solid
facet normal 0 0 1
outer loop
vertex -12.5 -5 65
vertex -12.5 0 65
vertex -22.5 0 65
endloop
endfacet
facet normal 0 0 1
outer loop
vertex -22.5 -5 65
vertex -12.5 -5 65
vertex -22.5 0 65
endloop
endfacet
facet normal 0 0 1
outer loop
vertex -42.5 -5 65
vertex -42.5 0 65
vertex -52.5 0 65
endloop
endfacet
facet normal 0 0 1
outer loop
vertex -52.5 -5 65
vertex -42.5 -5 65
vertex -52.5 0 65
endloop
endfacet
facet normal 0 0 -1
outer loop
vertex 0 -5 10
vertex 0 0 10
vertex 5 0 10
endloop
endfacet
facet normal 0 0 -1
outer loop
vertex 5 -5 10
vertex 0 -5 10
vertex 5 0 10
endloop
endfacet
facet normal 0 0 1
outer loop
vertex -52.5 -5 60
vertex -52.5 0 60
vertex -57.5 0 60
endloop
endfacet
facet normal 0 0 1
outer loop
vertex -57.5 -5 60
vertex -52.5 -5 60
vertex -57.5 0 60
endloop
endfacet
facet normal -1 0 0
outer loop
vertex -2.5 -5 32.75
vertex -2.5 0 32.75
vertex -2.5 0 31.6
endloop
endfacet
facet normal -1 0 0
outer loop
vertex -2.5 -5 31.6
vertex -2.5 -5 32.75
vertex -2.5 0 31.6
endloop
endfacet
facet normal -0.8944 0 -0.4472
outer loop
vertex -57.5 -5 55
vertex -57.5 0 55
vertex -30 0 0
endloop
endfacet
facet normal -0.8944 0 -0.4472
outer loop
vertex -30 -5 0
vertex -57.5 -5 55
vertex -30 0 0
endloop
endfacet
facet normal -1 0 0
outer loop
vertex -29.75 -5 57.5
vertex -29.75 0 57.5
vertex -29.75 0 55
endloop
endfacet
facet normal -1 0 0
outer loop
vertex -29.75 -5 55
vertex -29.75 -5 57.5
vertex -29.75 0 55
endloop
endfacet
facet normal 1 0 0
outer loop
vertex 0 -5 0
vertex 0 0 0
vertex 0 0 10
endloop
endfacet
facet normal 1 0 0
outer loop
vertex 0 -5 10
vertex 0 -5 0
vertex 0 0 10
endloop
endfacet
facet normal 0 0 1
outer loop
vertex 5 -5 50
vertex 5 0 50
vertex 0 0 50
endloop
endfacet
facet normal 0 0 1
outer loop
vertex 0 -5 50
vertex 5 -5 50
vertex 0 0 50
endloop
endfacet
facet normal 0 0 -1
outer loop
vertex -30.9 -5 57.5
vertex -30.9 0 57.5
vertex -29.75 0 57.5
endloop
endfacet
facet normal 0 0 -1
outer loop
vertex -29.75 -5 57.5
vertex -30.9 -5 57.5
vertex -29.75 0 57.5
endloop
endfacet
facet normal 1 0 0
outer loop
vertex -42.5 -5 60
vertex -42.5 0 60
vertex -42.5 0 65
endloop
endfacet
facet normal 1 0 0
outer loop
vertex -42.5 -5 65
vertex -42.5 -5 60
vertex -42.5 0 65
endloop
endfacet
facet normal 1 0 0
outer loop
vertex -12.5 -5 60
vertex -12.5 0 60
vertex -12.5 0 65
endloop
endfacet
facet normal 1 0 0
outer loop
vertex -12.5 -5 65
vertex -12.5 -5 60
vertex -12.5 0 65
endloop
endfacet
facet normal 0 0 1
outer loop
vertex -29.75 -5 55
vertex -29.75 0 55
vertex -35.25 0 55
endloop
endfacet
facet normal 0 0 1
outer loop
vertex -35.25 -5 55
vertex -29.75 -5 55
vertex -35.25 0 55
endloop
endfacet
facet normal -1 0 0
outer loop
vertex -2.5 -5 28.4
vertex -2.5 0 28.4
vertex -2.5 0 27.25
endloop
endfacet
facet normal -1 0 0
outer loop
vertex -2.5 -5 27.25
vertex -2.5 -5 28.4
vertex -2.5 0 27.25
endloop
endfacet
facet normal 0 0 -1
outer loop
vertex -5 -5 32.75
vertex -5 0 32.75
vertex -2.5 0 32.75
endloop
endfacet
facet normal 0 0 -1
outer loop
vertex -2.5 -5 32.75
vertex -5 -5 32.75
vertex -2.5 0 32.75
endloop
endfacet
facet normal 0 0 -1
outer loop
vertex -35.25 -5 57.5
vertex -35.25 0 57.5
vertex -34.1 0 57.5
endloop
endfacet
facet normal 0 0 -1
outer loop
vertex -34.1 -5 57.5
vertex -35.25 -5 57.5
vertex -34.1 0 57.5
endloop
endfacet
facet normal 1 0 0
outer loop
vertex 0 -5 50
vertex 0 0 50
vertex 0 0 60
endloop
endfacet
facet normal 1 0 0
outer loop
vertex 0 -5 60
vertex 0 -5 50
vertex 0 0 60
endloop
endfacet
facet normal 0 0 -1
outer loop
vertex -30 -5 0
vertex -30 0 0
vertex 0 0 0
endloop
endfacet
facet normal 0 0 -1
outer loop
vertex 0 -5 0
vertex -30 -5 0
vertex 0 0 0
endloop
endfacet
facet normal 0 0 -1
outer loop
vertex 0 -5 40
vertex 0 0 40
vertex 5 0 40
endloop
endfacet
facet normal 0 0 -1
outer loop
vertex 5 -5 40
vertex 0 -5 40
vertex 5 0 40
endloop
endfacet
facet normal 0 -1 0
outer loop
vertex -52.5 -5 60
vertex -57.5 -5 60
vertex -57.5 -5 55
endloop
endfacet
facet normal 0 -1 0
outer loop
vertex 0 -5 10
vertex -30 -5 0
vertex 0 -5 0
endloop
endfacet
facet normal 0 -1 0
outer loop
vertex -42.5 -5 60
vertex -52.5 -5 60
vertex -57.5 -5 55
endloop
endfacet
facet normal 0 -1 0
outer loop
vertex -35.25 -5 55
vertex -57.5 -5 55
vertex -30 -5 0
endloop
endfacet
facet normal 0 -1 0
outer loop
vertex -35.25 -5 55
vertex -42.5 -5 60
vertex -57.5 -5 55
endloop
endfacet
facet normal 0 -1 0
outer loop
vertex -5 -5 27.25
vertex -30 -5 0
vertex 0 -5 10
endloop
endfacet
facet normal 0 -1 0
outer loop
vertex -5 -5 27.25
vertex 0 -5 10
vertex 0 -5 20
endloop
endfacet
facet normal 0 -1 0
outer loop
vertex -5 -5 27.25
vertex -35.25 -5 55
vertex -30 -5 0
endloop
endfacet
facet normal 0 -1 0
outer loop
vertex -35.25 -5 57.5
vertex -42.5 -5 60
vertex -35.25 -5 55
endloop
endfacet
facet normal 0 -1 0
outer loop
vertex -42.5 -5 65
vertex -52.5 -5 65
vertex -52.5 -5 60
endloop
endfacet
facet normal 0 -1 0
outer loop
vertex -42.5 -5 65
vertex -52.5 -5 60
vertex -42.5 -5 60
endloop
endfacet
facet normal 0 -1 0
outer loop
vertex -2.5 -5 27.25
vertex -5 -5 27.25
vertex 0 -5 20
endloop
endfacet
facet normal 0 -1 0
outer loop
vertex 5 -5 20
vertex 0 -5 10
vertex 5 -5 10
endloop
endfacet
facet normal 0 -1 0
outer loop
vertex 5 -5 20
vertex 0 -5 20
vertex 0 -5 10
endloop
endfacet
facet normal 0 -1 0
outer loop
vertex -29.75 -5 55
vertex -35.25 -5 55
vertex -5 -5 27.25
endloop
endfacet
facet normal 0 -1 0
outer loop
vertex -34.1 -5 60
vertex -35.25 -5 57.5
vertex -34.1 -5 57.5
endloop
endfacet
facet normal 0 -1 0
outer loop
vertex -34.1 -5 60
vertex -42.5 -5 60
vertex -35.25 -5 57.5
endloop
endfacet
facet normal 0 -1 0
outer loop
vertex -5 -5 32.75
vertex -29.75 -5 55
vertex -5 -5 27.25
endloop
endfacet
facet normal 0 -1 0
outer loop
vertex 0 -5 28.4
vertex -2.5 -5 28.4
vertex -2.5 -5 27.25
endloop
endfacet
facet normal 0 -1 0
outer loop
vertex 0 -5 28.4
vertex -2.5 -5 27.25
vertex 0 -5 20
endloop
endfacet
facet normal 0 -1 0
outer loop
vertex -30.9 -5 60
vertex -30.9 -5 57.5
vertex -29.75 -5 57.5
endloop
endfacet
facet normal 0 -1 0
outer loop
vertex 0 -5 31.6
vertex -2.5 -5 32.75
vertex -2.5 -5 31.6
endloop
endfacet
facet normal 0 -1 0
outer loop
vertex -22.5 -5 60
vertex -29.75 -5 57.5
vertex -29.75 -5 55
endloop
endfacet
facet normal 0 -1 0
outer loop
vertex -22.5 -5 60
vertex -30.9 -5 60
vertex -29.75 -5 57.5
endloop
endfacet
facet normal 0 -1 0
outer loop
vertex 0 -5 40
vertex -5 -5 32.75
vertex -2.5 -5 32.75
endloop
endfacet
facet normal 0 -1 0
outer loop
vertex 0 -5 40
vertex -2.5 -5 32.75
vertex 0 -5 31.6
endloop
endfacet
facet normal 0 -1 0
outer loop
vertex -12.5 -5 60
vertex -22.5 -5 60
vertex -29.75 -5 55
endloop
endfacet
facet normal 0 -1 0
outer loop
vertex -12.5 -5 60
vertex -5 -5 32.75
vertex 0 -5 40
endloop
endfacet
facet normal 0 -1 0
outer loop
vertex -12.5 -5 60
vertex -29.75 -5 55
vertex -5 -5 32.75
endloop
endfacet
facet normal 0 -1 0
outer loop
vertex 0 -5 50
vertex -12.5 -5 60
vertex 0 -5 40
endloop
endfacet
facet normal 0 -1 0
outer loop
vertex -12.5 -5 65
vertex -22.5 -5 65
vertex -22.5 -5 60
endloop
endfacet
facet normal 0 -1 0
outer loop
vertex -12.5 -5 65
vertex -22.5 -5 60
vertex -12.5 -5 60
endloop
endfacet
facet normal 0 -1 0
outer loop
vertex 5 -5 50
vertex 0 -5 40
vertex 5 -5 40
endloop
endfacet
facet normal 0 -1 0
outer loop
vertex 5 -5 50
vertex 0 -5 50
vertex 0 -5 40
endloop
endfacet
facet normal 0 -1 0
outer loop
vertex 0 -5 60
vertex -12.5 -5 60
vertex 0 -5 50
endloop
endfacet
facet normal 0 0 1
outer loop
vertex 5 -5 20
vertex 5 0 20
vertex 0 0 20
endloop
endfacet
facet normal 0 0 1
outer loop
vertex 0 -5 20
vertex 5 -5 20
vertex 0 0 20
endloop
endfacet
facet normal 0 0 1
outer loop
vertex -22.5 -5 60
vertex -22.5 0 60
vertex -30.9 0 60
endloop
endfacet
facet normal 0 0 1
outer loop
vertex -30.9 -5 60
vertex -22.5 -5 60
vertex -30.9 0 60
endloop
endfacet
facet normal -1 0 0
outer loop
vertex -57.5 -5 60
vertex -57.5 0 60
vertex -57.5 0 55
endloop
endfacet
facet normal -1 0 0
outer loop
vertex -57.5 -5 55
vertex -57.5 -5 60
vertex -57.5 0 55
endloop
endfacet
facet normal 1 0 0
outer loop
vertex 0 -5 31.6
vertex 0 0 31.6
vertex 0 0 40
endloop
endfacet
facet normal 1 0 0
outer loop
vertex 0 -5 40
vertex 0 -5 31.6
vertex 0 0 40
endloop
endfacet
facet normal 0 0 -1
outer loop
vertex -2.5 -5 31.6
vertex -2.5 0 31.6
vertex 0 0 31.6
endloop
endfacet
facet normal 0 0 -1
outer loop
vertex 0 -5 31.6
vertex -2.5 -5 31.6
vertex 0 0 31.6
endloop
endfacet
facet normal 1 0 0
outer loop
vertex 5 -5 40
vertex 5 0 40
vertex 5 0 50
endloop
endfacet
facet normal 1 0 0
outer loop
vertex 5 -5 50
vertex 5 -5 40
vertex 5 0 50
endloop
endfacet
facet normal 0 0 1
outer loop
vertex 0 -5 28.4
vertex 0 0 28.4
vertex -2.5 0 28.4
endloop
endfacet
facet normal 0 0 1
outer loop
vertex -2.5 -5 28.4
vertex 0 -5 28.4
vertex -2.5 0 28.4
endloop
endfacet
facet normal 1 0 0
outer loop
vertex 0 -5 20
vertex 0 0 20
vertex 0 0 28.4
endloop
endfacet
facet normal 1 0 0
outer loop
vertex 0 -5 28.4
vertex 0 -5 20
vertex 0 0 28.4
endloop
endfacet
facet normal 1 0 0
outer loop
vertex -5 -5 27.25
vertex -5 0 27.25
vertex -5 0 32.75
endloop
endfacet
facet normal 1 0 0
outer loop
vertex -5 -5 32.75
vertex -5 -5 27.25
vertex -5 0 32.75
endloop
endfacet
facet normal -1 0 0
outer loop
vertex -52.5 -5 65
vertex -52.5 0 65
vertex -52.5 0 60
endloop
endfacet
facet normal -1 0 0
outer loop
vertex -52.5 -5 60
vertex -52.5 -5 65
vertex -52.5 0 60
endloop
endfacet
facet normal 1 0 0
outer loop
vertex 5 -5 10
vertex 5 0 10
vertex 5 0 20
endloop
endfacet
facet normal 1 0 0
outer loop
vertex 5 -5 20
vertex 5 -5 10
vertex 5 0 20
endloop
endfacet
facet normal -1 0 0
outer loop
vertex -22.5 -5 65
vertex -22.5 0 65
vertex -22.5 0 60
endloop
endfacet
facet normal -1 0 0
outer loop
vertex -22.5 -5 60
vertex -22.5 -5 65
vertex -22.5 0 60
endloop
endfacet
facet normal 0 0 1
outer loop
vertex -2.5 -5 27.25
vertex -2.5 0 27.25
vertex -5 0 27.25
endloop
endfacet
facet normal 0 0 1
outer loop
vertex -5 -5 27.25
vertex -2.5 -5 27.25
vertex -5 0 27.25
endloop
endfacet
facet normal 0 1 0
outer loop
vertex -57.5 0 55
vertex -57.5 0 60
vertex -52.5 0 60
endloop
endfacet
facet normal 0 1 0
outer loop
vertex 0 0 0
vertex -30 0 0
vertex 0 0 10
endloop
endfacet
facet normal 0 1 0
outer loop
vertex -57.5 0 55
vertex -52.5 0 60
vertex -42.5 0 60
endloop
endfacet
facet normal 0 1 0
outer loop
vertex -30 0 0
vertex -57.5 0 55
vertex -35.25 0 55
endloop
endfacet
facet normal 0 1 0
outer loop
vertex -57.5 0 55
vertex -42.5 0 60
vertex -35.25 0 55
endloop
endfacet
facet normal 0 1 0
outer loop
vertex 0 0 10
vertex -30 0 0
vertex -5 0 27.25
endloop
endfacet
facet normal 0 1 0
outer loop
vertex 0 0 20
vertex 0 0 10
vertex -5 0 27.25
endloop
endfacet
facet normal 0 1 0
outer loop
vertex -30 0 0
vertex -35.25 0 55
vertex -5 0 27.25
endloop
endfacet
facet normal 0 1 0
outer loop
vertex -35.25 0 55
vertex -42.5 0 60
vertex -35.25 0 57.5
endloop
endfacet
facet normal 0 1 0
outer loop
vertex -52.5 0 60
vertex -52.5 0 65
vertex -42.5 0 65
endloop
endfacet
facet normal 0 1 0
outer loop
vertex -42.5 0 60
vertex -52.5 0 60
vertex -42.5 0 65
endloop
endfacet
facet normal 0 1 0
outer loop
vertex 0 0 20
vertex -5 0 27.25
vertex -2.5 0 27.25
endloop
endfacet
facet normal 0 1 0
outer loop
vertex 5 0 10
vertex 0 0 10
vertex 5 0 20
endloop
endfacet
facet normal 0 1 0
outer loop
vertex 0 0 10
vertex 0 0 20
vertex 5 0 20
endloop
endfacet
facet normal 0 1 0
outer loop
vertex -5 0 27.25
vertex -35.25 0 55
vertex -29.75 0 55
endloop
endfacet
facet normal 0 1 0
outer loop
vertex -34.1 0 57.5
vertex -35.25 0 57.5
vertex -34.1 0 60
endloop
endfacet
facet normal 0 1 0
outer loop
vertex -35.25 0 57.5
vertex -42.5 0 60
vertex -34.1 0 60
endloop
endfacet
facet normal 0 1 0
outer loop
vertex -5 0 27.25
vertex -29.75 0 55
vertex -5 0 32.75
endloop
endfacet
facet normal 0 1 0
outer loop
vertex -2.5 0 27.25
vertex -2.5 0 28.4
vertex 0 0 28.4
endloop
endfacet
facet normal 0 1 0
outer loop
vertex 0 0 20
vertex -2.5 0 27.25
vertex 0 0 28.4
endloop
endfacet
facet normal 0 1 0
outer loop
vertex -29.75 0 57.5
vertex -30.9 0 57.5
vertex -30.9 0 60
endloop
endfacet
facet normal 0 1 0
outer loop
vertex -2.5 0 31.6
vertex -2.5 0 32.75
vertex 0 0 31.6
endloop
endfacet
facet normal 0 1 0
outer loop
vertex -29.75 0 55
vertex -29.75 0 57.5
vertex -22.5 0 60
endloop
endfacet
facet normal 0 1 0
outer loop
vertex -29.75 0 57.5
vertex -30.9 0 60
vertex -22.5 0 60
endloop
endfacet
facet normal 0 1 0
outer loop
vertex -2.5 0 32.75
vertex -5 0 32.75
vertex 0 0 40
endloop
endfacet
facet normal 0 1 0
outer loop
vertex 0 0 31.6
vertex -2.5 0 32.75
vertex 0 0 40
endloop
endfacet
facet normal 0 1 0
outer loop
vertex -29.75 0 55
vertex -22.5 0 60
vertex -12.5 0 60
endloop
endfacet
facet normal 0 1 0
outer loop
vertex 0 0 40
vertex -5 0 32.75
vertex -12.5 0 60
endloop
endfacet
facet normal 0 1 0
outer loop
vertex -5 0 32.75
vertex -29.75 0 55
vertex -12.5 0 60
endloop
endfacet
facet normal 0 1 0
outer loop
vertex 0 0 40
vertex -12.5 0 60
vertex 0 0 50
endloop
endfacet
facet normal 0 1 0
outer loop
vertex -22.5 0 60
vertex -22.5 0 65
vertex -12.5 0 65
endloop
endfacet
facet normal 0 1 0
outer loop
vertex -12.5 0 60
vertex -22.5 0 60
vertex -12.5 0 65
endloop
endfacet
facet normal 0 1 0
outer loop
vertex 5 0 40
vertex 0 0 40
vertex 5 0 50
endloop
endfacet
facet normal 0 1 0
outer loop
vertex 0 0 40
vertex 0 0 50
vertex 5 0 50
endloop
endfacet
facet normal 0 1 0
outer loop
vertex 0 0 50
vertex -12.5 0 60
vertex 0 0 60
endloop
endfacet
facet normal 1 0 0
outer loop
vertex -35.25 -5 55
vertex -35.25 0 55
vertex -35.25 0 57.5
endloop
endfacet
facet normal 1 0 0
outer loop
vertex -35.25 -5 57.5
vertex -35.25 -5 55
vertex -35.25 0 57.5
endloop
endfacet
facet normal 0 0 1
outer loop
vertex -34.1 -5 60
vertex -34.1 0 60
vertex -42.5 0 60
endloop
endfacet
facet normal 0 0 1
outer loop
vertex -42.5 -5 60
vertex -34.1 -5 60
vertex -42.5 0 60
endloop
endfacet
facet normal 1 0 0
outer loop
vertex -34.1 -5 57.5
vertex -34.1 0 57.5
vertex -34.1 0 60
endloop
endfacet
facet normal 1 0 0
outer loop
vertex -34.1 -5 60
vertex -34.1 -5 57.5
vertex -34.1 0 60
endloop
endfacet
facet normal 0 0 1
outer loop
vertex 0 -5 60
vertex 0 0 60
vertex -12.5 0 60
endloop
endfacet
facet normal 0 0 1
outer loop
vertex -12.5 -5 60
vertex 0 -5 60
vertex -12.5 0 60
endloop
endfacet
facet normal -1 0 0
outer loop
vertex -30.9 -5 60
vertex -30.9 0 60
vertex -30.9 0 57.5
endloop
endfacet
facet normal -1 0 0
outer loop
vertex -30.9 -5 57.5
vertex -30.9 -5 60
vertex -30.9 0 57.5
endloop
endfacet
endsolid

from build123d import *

# Parameters (mm, degrees)
F2_DEPTH = 5


with BuildPart() as f2:
    # F1 (on Front) → F2 (new body)
    with BuildSketch(Plane.XZ):
        Polygon((-30, 0), (0, 0), (0, 10), (5, 10), (5, 20), (0, 20), (0, 28.4), (-2.5, 28.4), (-2.5, 27.25), (-5, 27.25), (-5, 30), (-5, 32.75), (-2.5, 32.75), (-2.5, 31.6), (0, 31.6), (0, 40), (5, 40), (5, 50), (0, 50), (0, 60), (-12.5, 60), (-12.5, 65), (-22.5, 65), (-22.5, 60), (-30.9, 60), (-30.9, 57.5), (-29.75, 57.5), (-29.75, 55), (-32.5, 55), (-35.25, 55), (-35.25, 57.5), (-34.1, 57.5), (-34.1, 60), (-42.5, 60), (-42.5, 65), (-52.5, 65), (-52.5, 60), (-57.5, 60), (-57.5, 55), align=None)
    extrude(amount=F2_DEPTH)


solid = f2.part
